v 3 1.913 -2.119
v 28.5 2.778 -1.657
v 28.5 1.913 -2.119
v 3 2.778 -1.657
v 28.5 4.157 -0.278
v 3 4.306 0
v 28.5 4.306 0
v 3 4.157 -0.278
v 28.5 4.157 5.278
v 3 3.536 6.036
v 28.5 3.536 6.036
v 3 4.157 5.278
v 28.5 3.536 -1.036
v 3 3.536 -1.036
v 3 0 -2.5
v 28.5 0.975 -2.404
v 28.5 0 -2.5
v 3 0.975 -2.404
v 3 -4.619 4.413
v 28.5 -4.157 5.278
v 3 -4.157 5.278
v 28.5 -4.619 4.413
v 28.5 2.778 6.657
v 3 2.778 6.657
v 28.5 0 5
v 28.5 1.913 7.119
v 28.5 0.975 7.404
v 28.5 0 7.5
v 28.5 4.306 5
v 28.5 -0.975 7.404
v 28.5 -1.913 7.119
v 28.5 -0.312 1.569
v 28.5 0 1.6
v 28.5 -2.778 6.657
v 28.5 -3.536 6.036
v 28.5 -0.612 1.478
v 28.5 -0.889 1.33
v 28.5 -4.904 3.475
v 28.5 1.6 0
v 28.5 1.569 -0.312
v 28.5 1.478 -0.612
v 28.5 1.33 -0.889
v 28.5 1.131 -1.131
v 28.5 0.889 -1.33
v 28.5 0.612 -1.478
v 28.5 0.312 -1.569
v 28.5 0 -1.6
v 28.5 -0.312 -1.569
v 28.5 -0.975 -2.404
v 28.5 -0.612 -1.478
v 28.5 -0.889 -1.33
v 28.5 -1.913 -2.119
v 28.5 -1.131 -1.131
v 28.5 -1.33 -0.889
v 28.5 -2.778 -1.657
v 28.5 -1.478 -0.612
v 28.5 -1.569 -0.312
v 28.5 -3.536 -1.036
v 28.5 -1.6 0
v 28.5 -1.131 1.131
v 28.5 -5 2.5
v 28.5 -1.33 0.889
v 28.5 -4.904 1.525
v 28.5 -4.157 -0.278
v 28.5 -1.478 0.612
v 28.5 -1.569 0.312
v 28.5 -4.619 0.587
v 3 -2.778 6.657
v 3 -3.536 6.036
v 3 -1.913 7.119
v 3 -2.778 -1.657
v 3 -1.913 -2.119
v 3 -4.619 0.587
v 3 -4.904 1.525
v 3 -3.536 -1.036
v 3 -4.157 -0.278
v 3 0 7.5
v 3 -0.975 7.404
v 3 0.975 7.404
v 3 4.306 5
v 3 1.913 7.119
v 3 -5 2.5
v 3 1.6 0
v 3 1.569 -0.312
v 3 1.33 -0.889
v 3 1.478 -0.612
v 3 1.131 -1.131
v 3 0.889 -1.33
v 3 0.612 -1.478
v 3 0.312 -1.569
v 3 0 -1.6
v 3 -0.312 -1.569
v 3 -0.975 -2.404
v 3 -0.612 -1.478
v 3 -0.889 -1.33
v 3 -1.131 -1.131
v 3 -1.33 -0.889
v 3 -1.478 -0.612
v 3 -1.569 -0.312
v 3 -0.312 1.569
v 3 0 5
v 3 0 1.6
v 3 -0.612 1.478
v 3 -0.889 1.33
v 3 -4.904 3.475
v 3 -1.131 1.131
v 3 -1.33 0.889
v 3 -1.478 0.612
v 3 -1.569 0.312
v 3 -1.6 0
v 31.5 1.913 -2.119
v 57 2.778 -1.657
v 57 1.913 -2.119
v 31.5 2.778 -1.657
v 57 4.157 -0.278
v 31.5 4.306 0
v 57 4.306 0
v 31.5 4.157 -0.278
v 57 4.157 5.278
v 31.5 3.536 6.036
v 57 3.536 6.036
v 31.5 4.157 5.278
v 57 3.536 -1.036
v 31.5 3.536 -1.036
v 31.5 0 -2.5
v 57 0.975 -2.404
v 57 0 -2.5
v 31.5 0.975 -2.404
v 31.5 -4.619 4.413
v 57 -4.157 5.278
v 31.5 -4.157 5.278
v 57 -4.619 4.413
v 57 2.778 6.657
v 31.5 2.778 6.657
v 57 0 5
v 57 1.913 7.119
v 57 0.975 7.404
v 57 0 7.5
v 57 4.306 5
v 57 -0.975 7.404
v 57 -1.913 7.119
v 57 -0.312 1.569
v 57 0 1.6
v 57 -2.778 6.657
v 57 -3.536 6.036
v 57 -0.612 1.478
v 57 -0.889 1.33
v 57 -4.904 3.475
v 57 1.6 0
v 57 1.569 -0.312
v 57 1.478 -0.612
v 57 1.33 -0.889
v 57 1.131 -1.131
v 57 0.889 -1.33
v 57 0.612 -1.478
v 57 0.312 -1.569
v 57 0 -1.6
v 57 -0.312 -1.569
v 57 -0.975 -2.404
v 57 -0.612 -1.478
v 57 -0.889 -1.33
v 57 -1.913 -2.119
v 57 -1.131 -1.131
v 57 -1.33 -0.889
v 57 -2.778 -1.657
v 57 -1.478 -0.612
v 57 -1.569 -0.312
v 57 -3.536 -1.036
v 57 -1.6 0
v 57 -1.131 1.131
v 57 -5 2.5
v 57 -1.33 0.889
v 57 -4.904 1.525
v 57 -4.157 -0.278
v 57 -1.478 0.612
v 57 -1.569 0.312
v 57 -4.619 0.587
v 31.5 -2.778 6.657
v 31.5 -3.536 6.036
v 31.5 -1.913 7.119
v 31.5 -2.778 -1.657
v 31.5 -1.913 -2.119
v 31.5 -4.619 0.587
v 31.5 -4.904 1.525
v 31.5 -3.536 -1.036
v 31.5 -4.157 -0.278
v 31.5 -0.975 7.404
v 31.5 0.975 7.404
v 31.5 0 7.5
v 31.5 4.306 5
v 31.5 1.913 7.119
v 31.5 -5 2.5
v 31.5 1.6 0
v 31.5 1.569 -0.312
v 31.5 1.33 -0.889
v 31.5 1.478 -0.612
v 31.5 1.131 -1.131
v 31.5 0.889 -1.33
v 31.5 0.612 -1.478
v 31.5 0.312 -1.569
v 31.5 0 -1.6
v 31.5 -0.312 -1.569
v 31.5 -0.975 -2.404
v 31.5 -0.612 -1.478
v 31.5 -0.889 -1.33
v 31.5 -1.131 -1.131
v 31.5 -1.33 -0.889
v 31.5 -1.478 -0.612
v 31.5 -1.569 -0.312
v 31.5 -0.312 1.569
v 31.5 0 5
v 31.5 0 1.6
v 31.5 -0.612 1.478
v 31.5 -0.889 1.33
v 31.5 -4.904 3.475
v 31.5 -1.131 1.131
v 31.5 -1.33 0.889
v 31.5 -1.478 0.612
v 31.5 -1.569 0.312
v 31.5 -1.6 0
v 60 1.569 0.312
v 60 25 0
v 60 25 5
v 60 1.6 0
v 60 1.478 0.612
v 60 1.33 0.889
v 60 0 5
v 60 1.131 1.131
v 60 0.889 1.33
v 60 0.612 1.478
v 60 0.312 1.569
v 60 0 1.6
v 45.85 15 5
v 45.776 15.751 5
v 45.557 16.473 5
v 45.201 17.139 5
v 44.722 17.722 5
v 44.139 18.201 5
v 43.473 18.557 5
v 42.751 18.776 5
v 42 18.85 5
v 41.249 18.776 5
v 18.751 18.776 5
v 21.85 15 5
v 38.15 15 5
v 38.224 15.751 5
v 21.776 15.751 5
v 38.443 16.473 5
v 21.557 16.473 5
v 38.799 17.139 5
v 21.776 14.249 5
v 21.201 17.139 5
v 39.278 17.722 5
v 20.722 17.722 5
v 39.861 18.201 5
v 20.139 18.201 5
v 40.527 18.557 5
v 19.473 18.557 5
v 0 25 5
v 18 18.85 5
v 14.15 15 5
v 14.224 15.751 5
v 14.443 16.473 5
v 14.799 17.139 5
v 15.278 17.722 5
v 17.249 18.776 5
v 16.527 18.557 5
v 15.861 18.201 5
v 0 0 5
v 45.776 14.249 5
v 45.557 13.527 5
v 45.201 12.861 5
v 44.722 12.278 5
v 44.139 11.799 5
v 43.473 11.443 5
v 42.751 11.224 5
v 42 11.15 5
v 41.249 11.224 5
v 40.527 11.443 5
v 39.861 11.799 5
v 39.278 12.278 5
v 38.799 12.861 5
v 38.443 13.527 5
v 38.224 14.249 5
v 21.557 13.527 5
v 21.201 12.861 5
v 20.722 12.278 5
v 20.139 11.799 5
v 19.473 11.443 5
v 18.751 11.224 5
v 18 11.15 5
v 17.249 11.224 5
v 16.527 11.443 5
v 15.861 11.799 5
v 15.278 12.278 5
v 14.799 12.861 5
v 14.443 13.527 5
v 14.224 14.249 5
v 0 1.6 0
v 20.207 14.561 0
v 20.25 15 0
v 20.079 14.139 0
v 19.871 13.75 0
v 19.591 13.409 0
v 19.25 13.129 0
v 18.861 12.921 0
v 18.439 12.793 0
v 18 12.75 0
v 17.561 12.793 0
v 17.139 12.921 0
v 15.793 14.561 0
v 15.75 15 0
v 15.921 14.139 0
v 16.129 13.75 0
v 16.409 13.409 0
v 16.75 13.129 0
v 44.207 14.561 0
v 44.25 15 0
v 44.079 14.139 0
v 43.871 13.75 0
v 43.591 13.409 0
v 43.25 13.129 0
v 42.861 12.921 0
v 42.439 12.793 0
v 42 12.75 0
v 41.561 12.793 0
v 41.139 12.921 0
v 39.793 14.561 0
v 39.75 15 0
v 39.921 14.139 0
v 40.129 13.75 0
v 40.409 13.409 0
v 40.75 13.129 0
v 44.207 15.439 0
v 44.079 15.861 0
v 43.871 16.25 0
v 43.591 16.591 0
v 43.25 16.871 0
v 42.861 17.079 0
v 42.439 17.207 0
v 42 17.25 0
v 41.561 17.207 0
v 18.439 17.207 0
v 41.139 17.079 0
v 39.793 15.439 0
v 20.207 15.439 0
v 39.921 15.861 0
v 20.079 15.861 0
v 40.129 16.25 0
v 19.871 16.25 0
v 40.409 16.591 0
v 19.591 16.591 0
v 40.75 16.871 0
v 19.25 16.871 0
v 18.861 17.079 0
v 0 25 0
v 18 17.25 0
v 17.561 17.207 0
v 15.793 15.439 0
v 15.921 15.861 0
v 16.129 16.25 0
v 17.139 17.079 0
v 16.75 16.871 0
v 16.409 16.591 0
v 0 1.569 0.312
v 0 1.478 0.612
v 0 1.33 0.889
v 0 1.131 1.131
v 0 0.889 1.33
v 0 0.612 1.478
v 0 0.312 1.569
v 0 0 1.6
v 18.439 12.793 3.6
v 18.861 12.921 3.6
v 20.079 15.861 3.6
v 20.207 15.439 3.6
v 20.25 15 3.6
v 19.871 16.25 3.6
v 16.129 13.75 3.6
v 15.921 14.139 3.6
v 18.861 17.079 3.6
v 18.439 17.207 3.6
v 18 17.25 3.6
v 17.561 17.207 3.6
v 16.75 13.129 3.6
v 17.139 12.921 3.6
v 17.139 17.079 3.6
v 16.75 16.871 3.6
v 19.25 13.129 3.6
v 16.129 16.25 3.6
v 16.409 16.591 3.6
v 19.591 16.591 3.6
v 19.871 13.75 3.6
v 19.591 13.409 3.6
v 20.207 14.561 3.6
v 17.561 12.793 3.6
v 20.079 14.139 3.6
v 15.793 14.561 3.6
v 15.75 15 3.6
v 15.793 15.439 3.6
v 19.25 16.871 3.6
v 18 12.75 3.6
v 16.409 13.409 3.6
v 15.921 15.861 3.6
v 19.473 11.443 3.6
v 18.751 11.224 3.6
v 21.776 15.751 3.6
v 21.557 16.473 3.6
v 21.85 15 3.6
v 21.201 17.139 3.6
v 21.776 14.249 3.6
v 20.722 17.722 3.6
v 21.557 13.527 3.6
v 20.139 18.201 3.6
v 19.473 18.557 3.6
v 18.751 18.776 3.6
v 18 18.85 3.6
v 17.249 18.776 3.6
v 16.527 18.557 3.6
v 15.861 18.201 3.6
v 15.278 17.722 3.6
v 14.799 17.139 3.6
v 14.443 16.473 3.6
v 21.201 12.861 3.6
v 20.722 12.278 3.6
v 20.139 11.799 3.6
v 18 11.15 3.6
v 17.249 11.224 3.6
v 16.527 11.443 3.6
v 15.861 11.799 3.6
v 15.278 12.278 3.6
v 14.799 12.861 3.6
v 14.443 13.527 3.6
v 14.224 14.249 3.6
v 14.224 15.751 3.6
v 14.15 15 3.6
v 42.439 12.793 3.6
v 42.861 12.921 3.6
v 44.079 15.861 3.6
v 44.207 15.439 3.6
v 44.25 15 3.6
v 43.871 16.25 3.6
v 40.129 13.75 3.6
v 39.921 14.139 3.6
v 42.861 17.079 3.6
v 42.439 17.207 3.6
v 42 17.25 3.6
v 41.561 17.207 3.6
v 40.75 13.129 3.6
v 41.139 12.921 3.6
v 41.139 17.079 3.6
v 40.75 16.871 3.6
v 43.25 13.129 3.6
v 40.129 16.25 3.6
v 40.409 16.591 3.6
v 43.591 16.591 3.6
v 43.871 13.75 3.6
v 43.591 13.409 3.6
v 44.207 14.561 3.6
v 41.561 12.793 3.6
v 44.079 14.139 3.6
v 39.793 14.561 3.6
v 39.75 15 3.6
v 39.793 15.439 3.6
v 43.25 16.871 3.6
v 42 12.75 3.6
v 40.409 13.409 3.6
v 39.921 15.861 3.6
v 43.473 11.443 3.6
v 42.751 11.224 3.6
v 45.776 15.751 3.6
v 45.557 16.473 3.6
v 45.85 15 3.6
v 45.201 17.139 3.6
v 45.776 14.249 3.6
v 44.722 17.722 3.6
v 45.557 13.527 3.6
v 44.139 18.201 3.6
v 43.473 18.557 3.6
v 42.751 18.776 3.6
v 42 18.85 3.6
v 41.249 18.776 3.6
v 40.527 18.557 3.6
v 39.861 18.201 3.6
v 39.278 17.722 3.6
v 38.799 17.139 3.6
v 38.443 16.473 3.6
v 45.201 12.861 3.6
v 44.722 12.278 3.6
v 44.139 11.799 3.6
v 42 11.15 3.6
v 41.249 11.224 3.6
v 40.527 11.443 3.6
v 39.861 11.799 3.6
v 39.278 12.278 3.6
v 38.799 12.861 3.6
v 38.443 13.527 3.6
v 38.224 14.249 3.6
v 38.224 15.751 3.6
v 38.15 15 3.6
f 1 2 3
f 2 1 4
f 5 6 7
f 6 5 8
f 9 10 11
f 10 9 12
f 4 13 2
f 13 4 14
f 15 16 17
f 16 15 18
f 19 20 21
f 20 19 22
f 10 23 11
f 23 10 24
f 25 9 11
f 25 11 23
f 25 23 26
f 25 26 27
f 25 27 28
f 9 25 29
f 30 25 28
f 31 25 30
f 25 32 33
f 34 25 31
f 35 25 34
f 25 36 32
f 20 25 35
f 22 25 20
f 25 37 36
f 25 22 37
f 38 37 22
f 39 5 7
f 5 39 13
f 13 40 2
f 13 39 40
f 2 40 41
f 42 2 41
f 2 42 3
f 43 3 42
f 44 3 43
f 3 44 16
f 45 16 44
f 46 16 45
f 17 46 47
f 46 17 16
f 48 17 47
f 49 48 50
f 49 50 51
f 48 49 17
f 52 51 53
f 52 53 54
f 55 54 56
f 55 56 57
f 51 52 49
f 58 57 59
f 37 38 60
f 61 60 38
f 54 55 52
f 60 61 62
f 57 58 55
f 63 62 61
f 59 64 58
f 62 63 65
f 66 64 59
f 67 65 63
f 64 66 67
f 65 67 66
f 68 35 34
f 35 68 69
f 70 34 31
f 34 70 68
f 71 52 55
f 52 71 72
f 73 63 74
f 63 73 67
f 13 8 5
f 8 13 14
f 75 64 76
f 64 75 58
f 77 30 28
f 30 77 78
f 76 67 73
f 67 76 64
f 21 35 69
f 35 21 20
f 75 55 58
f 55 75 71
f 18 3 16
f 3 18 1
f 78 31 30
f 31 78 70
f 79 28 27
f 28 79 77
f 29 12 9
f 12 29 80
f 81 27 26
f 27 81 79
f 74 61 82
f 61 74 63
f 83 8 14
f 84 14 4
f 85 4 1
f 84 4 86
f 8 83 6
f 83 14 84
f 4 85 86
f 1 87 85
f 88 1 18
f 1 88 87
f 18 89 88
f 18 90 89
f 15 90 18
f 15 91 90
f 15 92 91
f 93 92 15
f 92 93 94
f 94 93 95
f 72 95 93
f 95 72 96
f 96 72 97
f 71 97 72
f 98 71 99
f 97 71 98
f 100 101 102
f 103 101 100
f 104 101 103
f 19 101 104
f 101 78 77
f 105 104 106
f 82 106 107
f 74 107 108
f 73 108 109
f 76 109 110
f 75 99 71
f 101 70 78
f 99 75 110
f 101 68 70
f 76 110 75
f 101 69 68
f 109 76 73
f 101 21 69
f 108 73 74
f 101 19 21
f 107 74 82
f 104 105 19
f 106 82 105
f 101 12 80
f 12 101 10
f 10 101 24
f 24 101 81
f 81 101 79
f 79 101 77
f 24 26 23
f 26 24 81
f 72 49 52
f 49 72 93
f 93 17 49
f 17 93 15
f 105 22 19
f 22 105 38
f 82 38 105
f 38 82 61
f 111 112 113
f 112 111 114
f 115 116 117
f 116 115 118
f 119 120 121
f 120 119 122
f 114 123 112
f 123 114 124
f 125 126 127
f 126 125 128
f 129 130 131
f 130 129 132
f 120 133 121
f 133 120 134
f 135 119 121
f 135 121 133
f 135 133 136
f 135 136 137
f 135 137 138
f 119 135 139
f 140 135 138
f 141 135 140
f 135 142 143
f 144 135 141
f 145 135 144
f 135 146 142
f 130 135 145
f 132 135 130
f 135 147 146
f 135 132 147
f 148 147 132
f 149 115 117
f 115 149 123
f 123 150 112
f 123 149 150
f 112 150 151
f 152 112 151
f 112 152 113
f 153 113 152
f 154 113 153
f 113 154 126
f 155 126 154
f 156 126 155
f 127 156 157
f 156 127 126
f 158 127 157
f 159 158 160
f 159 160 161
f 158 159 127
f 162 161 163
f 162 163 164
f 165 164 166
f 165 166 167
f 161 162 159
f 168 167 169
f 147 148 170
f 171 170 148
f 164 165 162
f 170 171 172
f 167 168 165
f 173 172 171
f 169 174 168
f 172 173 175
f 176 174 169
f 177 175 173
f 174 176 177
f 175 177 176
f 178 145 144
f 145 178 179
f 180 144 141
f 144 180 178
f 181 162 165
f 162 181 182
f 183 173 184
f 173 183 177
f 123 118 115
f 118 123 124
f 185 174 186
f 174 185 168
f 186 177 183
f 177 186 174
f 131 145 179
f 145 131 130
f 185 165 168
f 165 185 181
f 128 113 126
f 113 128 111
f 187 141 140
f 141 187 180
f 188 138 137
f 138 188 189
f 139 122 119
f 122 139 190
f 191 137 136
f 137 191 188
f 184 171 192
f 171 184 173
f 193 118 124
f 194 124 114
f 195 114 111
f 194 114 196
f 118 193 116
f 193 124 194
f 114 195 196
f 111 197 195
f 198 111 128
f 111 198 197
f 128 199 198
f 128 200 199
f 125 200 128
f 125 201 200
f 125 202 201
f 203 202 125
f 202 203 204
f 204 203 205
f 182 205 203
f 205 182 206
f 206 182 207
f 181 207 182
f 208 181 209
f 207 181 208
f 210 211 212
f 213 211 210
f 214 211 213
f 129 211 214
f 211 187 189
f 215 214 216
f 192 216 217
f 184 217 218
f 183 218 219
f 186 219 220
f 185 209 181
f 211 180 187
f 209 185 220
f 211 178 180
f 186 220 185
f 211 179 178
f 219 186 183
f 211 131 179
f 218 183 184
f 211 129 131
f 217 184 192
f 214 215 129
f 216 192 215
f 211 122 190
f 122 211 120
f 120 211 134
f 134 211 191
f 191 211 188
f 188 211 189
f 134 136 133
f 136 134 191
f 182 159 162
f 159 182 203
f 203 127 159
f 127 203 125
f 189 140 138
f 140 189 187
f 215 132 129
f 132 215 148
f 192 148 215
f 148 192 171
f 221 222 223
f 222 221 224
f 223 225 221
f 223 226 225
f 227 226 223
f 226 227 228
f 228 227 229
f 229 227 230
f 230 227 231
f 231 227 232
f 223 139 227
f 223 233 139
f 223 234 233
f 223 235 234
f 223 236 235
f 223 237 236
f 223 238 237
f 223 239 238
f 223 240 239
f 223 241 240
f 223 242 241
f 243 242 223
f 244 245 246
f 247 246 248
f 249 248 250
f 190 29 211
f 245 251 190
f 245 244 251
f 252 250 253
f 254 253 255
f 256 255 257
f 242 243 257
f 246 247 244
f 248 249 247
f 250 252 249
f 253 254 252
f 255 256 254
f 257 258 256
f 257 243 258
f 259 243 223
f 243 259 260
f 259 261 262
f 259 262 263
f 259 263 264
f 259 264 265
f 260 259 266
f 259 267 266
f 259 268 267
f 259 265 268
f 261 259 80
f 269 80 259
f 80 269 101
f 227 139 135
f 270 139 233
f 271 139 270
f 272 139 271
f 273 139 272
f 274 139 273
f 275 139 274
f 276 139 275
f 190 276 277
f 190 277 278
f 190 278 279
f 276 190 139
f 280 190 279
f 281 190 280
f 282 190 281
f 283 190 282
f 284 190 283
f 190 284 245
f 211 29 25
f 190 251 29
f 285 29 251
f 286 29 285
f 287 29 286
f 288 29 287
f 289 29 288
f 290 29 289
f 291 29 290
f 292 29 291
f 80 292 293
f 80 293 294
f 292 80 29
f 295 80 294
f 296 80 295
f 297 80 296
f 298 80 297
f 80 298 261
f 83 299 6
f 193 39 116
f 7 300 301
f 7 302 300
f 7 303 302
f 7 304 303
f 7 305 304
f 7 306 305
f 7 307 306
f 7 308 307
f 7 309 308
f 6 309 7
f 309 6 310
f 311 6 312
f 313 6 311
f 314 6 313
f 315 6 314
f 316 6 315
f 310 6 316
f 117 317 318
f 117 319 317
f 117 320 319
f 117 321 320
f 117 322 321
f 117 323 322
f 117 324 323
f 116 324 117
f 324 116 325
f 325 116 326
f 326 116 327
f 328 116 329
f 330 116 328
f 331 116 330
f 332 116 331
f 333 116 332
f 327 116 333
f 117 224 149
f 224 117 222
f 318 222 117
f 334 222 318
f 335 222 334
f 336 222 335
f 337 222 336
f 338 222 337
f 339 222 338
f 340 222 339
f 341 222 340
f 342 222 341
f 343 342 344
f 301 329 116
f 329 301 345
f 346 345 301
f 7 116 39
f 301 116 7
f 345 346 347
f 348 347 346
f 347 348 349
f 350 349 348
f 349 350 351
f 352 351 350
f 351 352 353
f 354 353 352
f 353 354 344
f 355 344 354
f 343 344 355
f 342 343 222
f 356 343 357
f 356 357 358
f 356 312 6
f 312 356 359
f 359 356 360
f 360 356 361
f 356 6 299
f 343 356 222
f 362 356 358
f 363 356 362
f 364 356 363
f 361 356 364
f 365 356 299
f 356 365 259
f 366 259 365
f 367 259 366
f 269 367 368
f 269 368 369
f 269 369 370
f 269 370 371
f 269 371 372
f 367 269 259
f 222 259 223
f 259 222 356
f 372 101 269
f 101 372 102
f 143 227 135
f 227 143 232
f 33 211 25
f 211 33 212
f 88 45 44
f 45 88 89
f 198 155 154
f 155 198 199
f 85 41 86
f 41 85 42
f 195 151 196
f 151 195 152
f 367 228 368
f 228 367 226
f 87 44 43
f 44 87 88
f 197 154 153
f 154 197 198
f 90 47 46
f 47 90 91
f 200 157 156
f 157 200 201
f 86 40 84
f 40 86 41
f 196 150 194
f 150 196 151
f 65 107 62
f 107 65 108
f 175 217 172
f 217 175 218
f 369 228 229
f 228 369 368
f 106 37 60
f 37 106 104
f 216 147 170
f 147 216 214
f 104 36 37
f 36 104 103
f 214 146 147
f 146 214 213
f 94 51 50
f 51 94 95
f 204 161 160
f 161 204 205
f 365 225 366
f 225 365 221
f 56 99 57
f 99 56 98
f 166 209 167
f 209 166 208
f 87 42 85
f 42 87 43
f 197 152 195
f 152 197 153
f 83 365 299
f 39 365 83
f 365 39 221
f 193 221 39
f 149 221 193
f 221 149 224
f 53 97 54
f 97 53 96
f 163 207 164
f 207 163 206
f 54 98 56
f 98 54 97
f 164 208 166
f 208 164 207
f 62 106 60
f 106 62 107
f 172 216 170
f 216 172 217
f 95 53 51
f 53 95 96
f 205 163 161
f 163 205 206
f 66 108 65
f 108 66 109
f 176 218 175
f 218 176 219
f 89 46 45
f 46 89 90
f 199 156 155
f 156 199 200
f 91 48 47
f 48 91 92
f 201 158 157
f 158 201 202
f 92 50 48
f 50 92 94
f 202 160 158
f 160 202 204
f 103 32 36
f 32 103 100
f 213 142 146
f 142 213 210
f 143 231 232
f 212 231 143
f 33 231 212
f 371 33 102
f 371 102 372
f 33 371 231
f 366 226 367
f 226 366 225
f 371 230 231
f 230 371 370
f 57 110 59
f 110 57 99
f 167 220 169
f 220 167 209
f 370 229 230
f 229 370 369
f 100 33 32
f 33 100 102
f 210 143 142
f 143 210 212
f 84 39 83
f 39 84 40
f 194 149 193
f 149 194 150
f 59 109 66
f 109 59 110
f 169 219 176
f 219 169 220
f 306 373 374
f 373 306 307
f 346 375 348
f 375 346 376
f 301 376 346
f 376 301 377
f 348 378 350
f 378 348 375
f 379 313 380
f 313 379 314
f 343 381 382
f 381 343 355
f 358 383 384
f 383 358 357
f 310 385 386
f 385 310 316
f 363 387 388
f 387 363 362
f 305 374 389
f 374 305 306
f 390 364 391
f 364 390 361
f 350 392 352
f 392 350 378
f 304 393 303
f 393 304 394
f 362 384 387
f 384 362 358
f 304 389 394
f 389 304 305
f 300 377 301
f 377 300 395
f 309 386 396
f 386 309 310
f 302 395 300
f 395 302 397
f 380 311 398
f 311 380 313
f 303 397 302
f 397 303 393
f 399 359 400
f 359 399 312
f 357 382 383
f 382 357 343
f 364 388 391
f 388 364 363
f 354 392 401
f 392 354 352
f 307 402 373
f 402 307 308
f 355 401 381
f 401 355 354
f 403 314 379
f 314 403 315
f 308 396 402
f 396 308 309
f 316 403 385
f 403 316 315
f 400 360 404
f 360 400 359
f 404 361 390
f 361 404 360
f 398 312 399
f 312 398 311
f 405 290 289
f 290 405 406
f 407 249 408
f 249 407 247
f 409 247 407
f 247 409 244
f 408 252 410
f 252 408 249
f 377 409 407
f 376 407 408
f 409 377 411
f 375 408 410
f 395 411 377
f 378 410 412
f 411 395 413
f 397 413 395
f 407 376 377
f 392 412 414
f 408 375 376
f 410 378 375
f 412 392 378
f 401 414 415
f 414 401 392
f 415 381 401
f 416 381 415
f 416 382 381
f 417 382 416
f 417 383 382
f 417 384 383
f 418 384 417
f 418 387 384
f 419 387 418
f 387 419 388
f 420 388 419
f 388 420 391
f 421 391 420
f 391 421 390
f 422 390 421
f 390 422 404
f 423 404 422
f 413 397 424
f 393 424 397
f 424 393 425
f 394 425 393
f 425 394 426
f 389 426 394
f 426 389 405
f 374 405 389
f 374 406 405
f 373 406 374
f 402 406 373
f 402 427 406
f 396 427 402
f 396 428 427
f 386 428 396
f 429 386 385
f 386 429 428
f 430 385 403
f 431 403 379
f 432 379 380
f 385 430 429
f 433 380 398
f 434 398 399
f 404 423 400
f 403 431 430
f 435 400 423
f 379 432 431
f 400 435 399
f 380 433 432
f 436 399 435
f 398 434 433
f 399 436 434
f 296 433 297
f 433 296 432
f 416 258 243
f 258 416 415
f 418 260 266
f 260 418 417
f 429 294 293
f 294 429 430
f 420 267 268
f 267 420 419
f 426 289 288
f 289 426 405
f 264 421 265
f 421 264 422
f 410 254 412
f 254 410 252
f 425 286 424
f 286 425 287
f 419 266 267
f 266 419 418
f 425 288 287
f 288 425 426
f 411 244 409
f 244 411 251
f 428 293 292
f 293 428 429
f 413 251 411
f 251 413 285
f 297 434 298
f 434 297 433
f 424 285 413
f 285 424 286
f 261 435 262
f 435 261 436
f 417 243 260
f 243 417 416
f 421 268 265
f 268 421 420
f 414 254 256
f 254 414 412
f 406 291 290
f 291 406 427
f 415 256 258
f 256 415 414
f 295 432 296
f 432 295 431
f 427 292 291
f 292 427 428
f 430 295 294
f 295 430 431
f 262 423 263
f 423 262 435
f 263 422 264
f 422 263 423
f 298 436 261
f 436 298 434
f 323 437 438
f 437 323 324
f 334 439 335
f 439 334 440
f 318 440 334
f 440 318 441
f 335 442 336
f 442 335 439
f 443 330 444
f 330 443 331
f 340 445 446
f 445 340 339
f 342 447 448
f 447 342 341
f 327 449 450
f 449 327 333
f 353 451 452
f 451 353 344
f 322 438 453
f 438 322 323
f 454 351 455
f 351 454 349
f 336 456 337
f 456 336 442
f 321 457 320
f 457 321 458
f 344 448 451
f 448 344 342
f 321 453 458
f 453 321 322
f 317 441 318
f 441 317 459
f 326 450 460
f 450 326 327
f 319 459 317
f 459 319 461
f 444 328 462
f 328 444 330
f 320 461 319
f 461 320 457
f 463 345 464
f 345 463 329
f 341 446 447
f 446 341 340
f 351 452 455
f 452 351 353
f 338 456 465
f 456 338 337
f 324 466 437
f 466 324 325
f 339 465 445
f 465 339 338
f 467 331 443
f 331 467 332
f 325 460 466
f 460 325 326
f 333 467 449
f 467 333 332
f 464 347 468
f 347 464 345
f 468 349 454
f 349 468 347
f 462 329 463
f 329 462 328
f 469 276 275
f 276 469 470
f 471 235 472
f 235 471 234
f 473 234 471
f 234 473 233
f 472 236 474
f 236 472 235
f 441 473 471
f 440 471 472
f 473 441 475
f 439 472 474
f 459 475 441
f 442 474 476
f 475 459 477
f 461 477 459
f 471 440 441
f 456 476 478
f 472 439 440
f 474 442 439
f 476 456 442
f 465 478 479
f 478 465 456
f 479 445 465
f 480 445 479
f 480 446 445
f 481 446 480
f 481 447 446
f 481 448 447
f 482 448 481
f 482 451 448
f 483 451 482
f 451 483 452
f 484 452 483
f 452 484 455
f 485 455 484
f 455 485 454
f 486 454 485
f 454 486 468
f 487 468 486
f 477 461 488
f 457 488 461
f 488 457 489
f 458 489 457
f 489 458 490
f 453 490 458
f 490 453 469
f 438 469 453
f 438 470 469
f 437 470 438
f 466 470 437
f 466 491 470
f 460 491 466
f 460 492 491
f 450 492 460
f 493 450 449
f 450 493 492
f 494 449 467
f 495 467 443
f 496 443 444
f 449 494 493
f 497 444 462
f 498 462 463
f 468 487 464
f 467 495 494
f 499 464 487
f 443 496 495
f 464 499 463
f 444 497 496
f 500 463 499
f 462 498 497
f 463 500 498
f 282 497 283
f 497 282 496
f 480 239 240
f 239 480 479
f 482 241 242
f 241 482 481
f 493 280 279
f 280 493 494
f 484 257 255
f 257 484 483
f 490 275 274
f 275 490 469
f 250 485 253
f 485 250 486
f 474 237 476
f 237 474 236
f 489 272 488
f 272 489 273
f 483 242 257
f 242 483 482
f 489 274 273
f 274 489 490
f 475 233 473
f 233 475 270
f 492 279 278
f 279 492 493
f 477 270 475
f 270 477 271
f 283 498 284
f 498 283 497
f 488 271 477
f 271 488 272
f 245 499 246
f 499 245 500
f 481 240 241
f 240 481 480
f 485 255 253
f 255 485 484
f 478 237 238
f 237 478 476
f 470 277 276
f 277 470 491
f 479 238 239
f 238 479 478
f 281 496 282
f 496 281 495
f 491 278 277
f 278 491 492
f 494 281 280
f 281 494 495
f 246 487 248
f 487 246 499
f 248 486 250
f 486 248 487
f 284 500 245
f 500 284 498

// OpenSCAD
$fn = 32;

// ----------------------------------------------------------------------
// Hinge leaf: 60 x 30 x 10 mm
// ----------------------------------------------------------------------

// --- parameters (mm) ---
tab_len = 60;             // leaf length, X
tab_w = 25;               // leaf width, Y
tab_t = 5;                // leaf thickness
ring_d = 10;              // knuckle diameter
ring_w = 25.5;            // knuckle width
knuckle_n = 2;            // number of knuckles
pin_d = 3.2;              // pin bore
gap = 3;                  // gap between the knuckles
screw_d = 4.5;            // screw clearance
cs_d = 7.7;               // countersink diameter
cs_h = 1.4;               // countersink depth

module leaf() {
  cube([tab_len, tab_w, tab_t]);
}

module knuckles() {
  /* barrels sit on the leaf edge, the pin axis at half the leaf thickness */
  for (i = [0 : knuckle_n - 1])
    translate([gap + i * (ring_w + gap), 0, tab_t * 0.5])
      rotate([0, 90, 0]) cylinder(h = ring_w, d = ring_d);
}

difference() {
  union() {
    leaf();
    knuckles();
  }
  rotate([0, 90, 0]) translate([0, 0, -1])
    cylinder(h = tab_len + 2, d = pin_d);
  translate([18, tab_w * 0.6, -1]) cylinder(h = tab_t + 2, d = screw_d);
  translate([18, tab_w * 0.6, tab_t - cs_h]) cylinder(h = cs_h + 0.5, d = cs_d);
  translate([42, tab_w * 0.6, -1]) cylinder(h = tab_t + 2, d = screw_d);
  translate([42, tab_w * 0.6, tab_t - cs_h]) cylinder(h = cs_h + 0.5, d = cs_d);
}
